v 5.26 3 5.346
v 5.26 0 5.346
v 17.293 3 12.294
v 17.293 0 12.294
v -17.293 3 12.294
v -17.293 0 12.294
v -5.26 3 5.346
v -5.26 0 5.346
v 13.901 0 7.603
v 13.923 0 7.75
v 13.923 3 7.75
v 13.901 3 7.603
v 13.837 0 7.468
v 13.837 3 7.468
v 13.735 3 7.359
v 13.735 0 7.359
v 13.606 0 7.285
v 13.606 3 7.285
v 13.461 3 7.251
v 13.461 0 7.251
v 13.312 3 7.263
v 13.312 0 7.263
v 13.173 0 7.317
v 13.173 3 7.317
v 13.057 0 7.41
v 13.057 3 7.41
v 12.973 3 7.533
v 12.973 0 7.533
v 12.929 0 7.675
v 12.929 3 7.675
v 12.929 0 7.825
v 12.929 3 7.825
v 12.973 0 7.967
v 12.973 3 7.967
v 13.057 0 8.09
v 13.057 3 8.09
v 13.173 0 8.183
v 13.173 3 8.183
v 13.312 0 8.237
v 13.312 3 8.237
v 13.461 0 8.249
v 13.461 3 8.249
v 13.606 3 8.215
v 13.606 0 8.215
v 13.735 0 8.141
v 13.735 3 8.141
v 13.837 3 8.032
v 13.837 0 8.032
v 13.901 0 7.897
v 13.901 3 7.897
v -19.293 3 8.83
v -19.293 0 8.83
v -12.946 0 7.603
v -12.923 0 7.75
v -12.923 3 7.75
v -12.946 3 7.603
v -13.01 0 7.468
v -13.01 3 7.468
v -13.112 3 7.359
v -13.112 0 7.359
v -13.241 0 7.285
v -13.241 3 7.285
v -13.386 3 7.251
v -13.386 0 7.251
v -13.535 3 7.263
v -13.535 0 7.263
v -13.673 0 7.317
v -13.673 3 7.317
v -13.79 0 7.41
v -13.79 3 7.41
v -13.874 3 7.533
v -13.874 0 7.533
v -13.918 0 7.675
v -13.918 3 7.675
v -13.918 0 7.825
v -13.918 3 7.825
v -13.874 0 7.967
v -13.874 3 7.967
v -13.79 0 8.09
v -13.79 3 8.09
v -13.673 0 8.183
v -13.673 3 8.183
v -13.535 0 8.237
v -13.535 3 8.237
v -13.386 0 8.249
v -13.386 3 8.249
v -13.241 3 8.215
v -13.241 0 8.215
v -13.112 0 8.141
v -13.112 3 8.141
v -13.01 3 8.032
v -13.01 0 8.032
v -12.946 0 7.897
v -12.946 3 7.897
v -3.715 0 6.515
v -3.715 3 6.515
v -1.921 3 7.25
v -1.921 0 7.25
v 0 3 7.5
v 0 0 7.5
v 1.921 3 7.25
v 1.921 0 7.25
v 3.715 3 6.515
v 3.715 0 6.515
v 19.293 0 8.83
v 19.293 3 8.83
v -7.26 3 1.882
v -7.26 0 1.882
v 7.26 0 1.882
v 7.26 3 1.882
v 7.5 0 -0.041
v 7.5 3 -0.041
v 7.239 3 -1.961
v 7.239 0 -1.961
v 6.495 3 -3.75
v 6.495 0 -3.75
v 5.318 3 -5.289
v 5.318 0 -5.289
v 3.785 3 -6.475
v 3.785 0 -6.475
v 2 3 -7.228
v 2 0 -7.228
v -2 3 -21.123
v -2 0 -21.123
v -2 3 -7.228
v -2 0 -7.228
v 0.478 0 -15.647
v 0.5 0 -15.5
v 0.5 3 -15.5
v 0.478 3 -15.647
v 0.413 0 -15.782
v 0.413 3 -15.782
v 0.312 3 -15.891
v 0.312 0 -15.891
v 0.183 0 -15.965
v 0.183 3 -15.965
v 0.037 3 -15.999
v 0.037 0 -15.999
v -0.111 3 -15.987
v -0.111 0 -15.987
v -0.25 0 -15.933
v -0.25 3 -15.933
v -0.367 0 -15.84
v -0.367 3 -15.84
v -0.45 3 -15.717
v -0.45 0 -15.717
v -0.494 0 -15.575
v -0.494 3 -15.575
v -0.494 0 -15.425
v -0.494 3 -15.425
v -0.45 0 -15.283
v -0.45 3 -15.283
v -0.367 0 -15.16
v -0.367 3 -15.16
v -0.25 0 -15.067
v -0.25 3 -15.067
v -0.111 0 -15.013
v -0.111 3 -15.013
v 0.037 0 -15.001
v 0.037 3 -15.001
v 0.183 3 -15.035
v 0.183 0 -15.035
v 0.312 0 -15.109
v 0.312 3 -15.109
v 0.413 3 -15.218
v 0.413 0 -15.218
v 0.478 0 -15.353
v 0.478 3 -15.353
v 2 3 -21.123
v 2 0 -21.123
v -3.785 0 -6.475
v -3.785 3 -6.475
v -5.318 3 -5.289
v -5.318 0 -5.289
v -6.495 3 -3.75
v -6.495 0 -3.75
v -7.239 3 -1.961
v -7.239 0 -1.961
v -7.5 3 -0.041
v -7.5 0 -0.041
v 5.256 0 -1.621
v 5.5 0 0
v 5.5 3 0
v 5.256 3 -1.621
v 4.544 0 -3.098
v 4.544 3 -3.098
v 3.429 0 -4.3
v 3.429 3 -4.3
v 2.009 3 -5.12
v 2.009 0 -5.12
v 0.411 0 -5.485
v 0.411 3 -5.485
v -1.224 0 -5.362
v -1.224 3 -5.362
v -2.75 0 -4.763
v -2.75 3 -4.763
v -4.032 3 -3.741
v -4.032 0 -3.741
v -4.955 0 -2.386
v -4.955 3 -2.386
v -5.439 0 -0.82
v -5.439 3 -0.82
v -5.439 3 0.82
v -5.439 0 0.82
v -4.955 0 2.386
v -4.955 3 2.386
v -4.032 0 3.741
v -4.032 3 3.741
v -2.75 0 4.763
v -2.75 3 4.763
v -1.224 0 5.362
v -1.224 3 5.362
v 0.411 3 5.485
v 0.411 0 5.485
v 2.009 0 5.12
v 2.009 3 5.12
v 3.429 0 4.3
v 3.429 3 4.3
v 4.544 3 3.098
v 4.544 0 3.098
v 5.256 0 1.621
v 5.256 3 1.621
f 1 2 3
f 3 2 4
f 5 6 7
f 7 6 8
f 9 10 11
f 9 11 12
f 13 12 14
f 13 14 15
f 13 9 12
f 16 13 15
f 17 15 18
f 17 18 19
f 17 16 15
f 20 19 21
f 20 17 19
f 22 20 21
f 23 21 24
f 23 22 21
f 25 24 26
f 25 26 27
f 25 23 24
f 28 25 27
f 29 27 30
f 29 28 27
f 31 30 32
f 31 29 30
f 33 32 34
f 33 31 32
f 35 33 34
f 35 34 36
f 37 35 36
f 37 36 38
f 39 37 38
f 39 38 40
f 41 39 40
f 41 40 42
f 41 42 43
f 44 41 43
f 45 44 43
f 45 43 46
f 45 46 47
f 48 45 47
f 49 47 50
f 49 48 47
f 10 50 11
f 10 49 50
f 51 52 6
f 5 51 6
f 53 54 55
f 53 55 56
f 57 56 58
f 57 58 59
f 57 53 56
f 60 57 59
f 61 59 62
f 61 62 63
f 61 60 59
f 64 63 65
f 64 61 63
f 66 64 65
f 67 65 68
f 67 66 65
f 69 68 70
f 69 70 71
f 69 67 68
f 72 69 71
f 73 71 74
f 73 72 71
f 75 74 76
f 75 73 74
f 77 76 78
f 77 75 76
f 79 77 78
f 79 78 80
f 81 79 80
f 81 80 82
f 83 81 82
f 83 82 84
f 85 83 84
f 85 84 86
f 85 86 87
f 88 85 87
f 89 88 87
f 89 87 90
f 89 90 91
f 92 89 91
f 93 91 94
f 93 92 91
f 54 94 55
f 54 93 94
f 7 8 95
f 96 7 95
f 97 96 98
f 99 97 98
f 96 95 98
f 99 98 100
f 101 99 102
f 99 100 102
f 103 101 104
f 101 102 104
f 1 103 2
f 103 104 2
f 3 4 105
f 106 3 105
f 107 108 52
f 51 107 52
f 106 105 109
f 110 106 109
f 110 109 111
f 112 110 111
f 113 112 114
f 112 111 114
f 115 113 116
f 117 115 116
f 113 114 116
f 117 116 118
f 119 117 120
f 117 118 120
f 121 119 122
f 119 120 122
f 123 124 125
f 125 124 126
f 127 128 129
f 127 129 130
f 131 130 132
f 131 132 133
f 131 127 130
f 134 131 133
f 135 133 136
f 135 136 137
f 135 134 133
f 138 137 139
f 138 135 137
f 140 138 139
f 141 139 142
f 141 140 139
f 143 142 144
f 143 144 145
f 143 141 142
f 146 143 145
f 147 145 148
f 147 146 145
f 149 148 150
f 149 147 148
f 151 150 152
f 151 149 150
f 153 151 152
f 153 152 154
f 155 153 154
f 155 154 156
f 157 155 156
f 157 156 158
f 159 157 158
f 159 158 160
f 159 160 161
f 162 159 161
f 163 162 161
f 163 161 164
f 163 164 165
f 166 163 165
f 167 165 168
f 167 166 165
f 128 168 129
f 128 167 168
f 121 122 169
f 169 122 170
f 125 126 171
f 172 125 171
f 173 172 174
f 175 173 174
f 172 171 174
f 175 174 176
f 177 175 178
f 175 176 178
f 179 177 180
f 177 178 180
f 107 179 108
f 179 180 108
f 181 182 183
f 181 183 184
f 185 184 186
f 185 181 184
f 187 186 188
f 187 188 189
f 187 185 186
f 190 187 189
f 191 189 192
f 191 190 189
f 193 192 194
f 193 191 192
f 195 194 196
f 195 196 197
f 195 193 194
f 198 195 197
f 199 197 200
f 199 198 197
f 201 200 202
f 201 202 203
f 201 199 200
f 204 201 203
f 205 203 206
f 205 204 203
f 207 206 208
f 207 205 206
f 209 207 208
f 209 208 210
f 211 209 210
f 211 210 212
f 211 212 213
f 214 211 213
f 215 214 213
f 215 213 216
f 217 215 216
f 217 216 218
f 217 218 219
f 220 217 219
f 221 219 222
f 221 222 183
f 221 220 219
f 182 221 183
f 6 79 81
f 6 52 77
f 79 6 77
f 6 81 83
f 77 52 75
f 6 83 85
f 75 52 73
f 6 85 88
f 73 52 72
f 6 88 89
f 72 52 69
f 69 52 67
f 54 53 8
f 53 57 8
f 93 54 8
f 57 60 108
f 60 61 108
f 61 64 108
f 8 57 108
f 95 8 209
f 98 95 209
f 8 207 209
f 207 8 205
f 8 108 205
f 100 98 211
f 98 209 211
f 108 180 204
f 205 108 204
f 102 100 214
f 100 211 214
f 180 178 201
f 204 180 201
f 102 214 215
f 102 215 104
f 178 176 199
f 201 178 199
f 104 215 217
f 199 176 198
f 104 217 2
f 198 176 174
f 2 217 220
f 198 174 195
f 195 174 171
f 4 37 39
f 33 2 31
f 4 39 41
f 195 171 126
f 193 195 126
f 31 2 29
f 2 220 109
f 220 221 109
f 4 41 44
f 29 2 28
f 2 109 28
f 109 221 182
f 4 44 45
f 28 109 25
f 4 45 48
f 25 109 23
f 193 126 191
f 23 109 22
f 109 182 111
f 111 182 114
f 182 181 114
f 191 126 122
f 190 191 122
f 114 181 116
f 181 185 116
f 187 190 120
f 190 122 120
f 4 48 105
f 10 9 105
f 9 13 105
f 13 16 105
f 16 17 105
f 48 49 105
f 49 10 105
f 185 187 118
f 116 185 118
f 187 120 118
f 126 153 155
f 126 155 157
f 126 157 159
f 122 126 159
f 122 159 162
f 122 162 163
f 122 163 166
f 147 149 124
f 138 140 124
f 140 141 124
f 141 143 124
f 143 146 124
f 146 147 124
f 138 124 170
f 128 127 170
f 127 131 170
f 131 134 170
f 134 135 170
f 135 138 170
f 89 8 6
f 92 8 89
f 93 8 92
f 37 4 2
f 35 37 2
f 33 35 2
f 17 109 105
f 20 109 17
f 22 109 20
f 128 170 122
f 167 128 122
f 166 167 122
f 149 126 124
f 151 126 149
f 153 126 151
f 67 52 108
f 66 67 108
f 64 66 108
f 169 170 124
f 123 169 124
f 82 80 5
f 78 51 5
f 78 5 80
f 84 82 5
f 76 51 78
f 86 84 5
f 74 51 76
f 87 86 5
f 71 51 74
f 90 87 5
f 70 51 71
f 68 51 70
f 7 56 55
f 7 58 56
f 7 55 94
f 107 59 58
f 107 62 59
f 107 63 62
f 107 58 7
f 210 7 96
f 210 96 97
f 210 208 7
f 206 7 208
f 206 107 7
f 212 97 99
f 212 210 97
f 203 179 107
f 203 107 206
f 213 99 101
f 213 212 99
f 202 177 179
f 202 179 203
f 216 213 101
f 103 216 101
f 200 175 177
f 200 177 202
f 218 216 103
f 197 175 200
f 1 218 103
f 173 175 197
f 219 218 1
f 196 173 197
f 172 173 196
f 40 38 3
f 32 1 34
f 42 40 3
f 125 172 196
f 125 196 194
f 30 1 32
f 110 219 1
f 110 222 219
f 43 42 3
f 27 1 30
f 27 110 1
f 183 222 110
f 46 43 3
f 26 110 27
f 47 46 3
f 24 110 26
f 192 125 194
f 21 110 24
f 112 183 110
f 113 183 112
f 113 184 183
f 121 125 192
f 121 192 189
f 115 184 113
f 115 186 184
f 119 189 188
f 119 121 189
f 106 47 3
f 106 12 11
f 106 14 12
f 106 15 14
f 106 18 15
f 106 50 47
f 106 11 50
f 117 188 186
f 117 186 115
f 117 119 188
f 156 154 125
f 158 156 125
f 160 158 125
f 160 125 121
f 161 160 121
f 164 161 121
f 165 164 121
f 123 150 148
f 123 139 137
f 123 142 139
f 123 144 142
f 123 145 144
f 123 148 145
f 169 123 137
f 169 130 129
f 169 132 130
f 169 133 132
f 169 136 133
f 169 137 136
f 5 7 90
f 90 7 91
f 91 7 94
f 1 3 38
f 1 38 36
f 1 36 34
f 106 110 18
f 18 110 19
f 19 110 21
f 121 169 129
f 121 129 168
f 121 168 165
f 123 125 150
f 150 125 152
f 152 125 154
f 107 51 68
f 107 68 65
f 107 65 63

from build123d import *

# Parameters (mm, degrees)
CROQUIS1_R              = 5.5
CROQUIS1_R_2            = 0.5
SALIENTE_EXTRUIR2_DEPTH = 3


with BuildPart() as part:
    # Croquis1 → Saliente-Extruir2 (new body)
    with BuildSketch(Plane(origin=(0, 0, 0), x_dir=(1, 0, 0), z_dir=(0, 1, 0))):
        with BuildLine():
            Line((-19.293466298, -8.829686884), (-17.293466298, -12.293788499))
            Line((-17.293466298, -12.293788499), (-5.259992013, -5.346258881))
            ThreePointArc((-5.259992013, -5.346258881), (0, -7.5), (5.259992013, -5.346258881))
            Line((5.259992013, -5.346258881), (17.293466298, -12.293788499))
            Line((17.293466298, -12.293788499), (19.293466298, -8.829686884))
            Line((19.293466298, -8.829686884), (7.259992013, -1.882157266))
            ThreePointArc((7.259992013, -1.882157266), (6.495190528, 3.75), (2, 7.228416147))
            Line((2, 7.228416147), (2, 21.123475383))
            Line((2, 21.123475383), (-2, 21.123475383))
            Line((-2, 21.123475383), (-2, 7.228416147))
            ThreePointArc((-2, 7.228416147), (-6.495190528, 3.75), (-7.259992013, -1.882157266))
            Line((-7.259992013, -1.882157266), (-19.293466298, -8.829686884))
        make_face()
        Circle(CROQUIS1_R, mode=Mode.SUBTRACT)
        with Locations((-13.423393759, -7.75)):
            Circle(CROQUIS1_R_2, mode=Mode.SUBTRACT)
        with Locations((0, 15.5)):
            Circle(CROQUIS1_R_2, mode=Mode.SUBTRACT)
        with Locations((13.423393759, -7.75)):
            Circle(CROQUIS1_R_2, mode=Mode.SUBTRACT)
    extrude(amount=SALIENTE_EXTRUIR2_DEPTH)


solid = part.part
